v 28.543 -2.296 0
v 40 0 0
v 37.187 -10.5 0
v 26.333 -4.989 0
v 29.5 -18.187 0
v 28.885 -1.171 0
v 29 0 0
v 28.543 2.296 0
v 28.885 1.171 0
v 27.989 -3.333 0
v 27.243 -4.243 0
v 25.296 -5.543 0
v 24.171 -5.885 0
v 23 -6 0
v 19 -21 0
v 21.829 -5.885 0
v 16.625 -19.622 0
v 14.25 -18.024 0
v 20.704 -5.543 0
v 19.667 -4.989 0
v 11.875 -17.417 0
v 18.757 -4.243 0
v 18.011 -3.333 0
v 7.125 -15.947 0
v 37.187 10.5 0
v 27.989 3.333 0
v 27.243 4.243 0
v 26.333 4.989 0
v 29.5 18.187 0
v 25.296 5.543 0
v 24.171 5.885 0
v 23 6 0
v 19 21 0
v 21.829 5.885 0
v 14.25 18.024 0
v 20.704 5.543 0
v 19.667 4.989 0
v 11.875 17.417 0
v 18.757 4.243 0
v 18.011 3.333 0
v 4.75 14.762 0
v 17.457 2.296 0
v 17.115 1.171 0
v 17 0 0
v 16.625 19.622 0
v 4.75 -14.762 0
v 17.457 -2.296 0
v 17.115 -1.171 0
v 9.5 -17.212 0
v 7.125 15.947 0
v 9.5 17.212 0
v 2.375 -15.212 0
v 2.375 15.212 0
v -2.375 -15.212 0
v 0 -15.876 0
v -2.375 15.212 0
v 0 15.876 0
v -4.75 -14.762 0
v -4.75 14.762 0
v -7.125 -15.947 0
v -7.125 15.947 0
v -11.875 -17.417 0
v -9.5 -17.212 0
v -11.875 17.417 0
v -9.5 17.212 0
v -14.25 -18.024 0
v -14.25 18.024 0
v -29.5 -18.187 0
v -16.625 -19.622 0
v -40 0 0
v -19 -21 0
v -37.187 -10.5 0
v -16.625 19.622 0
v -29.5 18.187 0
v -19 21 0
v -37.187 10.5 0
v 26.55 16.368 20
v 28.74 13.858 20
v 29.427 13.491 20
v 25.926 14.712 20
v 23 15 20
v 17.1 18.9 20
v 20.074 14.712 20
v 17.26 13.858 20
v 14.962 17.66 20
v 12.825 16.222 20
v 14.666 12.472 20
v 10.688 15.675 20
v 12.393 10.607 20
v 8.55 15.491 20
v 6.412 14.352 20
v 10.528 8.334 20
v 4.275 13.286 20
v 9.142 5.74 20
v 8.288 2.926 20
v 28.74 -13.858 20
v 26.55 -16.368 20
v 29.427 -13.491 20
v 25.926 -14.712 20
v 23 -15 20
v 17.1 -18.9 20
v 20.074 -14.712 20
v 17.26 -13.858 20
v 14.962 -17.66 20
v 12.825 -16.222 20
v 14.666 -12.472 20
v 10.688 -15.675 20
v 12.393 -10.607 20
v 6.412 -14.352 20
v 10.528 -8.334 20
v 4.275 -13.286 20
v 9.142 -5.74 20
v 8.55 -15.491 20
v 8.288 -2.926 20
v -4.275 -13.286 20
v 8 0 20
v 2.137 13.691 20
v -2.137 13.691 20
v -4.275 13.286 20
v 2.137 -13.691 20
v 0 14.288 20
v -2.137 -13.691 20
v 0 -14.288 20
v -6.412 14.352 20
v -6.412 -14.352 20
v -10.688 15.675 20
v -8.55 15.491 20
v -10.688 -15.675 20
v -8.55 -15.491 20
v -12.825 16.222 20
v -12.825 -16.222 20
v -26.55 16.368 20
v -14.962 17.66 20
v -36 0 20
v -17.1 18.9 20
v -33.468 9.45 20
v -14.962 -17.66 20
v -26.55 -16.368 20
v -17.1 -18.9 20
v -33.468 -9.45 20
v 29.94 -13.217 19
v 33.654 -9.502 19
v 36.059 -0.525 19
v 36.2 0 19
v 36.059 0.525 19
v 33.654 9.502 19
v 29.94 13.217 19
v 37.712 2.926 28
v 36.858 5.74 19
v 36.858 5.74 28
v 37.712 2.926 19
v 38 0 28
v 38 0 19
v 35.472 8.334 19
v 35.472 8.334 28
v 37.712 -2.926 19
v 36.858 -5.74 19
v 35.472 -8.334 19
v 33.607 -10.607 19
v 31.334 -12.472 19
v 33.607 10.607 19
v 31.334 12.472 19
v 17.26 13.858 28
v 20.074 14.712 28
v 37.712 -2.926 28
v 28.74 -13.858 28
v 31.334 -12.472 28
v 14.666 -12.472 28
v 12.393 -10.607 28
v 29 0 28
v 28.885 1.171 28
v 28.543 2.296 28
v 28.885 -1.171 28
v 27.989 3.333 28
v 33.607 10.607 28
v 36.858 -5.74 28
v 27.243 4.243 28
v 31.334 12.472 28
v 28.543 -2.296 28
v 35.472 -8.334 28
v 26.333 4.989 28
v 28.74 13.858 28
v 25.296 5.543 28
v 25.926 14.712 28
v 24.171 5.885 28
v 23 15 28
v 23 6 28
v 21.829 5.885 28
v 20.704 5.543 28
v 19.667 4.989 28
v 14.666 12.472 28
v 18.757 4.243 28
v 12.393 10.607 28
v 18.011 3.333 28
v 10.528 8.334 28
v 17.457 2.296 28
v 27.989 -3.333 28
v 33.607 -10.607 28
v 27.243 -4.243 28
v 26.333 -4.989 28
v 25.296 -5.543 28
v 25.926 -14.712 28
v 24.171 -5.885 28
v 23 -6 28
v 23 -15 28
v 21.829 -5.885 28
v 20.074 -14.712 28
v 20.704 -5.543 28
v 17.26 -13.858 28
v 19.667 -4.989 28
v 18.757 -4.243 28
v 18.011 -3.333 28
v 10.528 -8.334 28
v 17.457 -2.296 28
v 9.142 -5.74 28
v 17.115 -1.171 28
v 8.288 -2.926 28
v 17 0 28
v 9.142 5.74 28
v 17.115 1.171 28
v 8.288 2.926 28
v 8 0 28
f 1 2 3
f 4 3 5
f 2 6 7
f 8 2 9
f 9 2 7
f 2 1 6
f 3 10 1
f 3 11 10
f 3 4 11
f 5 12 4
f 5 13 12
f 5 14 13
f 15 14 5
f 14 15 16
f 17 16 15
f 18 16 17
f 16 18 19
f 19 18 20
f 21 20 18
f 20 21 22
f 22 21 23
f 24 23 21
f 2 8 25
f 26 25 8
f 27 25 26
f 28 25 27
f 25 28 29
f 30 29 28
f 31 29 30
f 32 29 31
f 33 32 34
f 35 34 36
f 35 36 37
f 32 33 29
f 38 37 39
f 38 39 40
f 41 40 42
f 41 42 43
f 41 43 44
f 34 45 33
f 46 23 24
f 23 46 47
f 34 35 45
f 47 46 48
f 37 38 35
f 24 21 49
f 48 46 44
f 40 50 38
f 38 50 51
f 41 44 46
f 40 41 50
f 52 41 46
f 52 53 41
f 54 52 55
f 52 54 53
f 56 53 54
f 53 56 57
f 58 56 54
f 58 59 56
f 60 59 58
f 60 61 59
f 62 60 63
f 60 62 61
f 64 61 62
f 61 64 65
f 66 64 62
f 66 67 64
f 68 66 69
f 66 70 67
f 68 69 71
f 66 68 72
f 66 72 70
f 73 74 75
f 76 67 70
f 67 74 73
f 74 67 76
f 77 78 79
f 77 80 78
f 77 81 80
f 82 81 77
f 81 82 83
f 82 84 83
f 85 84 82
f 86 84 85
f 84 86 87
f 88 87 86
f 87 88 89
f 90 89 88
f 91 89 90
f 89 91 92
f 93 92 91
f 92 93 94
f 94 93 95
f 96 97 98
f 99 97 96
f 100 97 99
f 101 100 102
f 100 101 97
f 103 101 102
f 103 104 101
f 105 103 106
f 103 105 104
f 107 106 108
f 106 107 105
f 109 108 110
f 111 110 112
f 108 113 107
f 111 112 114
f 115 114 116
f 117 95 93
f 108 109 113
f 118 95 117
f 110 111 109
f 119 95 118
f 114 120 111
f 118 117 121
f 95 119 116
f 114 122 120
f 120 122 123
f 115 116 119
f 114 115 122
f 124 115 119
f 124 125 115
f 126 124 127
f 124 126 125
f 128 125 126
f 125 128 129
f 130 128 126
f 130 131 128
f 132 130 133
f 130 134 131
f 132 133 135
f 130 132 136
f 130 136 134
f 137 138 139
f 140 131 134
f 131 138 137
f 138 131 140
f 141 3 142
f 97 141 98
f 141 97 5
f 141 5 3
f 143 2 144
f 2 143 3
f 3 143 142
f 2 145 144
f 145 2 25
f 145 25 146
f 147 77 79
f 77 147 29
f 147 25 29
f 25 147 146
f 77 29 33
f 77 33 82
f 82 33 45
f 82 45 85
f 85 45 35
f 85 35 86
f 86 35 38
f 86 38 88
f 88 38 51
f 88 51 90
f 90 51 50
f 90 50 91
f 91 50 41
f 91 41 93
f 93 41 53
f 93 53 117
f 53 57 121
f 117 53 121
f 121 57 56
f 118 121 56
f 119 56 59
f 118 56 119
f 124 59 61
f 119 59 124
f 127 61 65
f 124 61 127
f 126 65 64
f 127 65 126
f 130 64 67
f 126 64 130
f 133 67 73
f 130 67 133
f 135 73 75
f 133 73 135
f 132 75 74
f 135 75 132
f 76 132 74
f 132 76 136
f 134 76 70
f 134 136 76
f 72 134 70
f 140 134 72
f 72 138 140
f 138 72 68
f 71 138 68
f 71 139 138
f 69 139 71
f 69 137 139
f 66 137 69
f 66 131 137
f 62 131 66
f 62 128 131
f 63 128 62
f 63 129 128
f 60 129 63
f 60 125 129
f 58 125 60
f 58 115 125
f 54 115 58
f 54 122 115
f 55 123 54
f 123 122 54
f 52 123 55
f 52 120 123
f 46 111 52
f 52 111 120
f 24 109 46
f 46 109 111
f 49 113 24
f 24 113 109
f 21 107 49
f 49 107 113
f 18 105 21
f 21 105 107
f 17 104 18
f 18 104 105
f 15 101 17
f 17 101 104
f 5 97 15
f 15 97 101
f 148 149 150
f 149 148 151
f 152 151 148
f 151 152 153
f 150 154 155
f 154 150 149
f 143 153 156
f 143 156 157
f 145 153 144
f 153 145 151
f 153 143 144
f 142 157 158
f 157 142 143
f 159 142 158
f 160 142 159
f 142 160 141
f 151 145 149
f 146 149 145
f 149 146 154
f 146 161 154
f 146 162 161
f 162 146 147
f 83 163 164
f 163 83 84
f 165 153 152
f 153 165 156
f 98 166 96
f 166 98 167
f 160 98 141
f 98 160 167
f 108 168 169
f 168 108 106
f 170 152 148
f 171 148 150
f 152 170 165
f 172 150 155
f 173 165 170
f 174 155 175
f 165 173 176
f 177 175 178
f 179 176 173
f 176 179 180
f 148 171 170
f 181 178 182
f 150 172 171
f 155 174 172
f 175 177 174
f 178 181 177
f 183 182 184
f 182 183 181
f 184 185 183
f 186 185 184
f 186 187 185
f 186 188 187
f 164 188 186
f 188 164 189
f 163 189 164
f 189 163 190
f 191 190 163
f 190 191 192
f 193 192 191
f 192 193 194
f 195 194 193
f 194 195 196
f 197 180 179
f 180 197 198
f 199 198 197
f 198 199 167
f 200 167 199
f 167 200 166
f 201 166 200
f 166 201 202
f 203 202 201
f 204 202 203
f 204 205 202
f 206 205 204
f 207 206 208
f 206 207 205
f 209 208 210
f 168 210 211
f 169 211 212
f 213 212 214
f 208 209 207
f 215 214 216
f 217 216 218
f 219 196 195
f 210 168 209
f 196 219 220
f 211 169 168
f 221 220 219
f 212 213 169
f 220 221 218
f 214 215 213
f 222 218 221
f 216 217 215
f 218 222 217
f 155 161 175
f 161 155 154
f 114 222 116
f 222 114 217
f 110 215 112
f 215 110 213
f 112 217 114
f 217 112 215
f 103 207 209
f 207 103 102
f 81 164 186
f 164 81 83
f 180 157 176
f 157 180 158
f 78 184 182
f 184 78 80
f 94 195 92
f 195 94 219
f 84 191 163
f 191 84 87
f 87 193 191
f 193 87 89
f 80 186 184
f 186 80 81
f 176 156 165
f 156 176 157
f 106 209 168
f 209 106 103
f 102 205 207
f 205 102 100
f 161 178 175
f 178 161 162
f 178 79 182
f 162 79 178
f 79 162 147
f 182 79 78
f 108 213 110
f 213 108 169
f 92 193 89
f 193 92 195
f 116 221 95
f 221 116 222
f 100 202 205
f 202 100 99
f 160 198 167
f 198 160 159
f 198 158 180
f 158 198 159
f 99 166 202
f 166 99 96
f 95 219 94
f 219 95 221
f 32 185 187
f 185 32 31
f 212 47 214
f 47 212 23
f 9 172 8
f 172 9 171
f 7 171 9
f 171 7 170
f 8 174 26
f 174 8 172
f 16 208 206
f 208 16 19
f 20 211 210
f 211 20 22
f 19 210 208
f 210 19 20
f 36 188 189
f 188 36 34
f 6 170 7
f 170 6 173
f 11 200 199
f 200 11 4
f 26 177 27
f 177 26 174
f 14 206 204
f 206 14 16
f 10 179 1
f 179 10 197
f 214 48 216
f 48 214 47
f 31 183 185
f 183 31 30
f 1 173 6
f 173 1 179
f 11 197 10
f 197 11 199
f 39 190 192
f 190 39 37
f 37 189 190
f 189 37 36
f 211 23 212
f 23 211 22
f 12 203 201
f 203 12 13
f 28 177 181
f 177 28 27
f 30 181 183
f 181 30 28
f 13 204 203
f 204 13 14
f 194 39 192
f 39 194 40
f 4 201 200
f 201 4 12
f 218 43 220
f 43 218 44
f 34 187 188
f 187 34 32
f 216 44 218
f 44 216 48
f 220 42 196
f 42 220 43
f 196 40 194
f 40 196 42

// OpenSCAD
$fn = 32;

// ----------------------------------------------------------------------
// Handle: 80 x 42 mm grip, 20 mm thick
// ----------------------------------------------------------------------

// --- parameters (mm) ---
length = 80;              // grip length
width = 42;               // grip width
thickness = 20;           // grip thickness
waist = 0.72;             // width factor at the middle
draft = 0.9;              // top face scale of the extrusion
scallops = 4;             // finger rests per side
ripple = 0.05;            // depth factor of the finger rests
boss_d = 30;              // mounting boss diameter
boss_h = 8;               // mounting boss height
boss_hole_d = 12;         // screw clearance through the boss
boss_r = 23;              // boss centre from the grip centre

/* ergonomic grip outline, closed spline-like polygon in the XY plane */
grip = [[-19, 21], [-16.625, 19.622], [-14.25, 18.024], [-11.875, 17.417], [-9.5, 17.212], [-7.125, 15.947], [-4.75, 14.762], [-2.375, 15.212], [0, 15.876], [2.375, 15.212], [4.75, 14.762], [7.125, 15.947], [9.5, 17.212], [11.875, 17.417], [14.25, 18.024], [16.625, 19.622], [19, 21], [29.5, 18.187], [37.187, 10.5], [40, 0], [37.187, -10.5], [29.5, -18.187], [19, -21], [19, -21], [16.625, -19.622], [14.25, -18.024], [11.875, -17.417], [9.5, -17.212], [7.125, -15.947], [4.75, -14.762], [2.375, -15.212], [0, -15.876], [-2.375, -15.212], [-4.75, -14.762], [-7.125, -15.947], [-9.5, -17.212], [-11.875, -17.417], [-14.25, -18.024], [-16.625, -19.622], [-19, -21], [-29.5, -18.187], [-37.187, -10.5], [-40, 0], [-37.187, 10.5], [-29.5, 18.187], [-19, 21]];

module grip_body() {
  linear_extrude(height = thickness, scale = draft) polygon(grip);
}

module boss_body() {
  /* sunk 1 mm into the grip so the joint overlaps */
  translate([boss_r, 0, thickness - 1]) cylinder(h = boss_h + 1, d = boss_d);
}

difference() {
  union() {
    grip_body();
    boss_body();
  }
  translate([boss_r, 0, -1]) cylinder(h = thickness + boss_h + 2, d = boss_hole_d);
}
